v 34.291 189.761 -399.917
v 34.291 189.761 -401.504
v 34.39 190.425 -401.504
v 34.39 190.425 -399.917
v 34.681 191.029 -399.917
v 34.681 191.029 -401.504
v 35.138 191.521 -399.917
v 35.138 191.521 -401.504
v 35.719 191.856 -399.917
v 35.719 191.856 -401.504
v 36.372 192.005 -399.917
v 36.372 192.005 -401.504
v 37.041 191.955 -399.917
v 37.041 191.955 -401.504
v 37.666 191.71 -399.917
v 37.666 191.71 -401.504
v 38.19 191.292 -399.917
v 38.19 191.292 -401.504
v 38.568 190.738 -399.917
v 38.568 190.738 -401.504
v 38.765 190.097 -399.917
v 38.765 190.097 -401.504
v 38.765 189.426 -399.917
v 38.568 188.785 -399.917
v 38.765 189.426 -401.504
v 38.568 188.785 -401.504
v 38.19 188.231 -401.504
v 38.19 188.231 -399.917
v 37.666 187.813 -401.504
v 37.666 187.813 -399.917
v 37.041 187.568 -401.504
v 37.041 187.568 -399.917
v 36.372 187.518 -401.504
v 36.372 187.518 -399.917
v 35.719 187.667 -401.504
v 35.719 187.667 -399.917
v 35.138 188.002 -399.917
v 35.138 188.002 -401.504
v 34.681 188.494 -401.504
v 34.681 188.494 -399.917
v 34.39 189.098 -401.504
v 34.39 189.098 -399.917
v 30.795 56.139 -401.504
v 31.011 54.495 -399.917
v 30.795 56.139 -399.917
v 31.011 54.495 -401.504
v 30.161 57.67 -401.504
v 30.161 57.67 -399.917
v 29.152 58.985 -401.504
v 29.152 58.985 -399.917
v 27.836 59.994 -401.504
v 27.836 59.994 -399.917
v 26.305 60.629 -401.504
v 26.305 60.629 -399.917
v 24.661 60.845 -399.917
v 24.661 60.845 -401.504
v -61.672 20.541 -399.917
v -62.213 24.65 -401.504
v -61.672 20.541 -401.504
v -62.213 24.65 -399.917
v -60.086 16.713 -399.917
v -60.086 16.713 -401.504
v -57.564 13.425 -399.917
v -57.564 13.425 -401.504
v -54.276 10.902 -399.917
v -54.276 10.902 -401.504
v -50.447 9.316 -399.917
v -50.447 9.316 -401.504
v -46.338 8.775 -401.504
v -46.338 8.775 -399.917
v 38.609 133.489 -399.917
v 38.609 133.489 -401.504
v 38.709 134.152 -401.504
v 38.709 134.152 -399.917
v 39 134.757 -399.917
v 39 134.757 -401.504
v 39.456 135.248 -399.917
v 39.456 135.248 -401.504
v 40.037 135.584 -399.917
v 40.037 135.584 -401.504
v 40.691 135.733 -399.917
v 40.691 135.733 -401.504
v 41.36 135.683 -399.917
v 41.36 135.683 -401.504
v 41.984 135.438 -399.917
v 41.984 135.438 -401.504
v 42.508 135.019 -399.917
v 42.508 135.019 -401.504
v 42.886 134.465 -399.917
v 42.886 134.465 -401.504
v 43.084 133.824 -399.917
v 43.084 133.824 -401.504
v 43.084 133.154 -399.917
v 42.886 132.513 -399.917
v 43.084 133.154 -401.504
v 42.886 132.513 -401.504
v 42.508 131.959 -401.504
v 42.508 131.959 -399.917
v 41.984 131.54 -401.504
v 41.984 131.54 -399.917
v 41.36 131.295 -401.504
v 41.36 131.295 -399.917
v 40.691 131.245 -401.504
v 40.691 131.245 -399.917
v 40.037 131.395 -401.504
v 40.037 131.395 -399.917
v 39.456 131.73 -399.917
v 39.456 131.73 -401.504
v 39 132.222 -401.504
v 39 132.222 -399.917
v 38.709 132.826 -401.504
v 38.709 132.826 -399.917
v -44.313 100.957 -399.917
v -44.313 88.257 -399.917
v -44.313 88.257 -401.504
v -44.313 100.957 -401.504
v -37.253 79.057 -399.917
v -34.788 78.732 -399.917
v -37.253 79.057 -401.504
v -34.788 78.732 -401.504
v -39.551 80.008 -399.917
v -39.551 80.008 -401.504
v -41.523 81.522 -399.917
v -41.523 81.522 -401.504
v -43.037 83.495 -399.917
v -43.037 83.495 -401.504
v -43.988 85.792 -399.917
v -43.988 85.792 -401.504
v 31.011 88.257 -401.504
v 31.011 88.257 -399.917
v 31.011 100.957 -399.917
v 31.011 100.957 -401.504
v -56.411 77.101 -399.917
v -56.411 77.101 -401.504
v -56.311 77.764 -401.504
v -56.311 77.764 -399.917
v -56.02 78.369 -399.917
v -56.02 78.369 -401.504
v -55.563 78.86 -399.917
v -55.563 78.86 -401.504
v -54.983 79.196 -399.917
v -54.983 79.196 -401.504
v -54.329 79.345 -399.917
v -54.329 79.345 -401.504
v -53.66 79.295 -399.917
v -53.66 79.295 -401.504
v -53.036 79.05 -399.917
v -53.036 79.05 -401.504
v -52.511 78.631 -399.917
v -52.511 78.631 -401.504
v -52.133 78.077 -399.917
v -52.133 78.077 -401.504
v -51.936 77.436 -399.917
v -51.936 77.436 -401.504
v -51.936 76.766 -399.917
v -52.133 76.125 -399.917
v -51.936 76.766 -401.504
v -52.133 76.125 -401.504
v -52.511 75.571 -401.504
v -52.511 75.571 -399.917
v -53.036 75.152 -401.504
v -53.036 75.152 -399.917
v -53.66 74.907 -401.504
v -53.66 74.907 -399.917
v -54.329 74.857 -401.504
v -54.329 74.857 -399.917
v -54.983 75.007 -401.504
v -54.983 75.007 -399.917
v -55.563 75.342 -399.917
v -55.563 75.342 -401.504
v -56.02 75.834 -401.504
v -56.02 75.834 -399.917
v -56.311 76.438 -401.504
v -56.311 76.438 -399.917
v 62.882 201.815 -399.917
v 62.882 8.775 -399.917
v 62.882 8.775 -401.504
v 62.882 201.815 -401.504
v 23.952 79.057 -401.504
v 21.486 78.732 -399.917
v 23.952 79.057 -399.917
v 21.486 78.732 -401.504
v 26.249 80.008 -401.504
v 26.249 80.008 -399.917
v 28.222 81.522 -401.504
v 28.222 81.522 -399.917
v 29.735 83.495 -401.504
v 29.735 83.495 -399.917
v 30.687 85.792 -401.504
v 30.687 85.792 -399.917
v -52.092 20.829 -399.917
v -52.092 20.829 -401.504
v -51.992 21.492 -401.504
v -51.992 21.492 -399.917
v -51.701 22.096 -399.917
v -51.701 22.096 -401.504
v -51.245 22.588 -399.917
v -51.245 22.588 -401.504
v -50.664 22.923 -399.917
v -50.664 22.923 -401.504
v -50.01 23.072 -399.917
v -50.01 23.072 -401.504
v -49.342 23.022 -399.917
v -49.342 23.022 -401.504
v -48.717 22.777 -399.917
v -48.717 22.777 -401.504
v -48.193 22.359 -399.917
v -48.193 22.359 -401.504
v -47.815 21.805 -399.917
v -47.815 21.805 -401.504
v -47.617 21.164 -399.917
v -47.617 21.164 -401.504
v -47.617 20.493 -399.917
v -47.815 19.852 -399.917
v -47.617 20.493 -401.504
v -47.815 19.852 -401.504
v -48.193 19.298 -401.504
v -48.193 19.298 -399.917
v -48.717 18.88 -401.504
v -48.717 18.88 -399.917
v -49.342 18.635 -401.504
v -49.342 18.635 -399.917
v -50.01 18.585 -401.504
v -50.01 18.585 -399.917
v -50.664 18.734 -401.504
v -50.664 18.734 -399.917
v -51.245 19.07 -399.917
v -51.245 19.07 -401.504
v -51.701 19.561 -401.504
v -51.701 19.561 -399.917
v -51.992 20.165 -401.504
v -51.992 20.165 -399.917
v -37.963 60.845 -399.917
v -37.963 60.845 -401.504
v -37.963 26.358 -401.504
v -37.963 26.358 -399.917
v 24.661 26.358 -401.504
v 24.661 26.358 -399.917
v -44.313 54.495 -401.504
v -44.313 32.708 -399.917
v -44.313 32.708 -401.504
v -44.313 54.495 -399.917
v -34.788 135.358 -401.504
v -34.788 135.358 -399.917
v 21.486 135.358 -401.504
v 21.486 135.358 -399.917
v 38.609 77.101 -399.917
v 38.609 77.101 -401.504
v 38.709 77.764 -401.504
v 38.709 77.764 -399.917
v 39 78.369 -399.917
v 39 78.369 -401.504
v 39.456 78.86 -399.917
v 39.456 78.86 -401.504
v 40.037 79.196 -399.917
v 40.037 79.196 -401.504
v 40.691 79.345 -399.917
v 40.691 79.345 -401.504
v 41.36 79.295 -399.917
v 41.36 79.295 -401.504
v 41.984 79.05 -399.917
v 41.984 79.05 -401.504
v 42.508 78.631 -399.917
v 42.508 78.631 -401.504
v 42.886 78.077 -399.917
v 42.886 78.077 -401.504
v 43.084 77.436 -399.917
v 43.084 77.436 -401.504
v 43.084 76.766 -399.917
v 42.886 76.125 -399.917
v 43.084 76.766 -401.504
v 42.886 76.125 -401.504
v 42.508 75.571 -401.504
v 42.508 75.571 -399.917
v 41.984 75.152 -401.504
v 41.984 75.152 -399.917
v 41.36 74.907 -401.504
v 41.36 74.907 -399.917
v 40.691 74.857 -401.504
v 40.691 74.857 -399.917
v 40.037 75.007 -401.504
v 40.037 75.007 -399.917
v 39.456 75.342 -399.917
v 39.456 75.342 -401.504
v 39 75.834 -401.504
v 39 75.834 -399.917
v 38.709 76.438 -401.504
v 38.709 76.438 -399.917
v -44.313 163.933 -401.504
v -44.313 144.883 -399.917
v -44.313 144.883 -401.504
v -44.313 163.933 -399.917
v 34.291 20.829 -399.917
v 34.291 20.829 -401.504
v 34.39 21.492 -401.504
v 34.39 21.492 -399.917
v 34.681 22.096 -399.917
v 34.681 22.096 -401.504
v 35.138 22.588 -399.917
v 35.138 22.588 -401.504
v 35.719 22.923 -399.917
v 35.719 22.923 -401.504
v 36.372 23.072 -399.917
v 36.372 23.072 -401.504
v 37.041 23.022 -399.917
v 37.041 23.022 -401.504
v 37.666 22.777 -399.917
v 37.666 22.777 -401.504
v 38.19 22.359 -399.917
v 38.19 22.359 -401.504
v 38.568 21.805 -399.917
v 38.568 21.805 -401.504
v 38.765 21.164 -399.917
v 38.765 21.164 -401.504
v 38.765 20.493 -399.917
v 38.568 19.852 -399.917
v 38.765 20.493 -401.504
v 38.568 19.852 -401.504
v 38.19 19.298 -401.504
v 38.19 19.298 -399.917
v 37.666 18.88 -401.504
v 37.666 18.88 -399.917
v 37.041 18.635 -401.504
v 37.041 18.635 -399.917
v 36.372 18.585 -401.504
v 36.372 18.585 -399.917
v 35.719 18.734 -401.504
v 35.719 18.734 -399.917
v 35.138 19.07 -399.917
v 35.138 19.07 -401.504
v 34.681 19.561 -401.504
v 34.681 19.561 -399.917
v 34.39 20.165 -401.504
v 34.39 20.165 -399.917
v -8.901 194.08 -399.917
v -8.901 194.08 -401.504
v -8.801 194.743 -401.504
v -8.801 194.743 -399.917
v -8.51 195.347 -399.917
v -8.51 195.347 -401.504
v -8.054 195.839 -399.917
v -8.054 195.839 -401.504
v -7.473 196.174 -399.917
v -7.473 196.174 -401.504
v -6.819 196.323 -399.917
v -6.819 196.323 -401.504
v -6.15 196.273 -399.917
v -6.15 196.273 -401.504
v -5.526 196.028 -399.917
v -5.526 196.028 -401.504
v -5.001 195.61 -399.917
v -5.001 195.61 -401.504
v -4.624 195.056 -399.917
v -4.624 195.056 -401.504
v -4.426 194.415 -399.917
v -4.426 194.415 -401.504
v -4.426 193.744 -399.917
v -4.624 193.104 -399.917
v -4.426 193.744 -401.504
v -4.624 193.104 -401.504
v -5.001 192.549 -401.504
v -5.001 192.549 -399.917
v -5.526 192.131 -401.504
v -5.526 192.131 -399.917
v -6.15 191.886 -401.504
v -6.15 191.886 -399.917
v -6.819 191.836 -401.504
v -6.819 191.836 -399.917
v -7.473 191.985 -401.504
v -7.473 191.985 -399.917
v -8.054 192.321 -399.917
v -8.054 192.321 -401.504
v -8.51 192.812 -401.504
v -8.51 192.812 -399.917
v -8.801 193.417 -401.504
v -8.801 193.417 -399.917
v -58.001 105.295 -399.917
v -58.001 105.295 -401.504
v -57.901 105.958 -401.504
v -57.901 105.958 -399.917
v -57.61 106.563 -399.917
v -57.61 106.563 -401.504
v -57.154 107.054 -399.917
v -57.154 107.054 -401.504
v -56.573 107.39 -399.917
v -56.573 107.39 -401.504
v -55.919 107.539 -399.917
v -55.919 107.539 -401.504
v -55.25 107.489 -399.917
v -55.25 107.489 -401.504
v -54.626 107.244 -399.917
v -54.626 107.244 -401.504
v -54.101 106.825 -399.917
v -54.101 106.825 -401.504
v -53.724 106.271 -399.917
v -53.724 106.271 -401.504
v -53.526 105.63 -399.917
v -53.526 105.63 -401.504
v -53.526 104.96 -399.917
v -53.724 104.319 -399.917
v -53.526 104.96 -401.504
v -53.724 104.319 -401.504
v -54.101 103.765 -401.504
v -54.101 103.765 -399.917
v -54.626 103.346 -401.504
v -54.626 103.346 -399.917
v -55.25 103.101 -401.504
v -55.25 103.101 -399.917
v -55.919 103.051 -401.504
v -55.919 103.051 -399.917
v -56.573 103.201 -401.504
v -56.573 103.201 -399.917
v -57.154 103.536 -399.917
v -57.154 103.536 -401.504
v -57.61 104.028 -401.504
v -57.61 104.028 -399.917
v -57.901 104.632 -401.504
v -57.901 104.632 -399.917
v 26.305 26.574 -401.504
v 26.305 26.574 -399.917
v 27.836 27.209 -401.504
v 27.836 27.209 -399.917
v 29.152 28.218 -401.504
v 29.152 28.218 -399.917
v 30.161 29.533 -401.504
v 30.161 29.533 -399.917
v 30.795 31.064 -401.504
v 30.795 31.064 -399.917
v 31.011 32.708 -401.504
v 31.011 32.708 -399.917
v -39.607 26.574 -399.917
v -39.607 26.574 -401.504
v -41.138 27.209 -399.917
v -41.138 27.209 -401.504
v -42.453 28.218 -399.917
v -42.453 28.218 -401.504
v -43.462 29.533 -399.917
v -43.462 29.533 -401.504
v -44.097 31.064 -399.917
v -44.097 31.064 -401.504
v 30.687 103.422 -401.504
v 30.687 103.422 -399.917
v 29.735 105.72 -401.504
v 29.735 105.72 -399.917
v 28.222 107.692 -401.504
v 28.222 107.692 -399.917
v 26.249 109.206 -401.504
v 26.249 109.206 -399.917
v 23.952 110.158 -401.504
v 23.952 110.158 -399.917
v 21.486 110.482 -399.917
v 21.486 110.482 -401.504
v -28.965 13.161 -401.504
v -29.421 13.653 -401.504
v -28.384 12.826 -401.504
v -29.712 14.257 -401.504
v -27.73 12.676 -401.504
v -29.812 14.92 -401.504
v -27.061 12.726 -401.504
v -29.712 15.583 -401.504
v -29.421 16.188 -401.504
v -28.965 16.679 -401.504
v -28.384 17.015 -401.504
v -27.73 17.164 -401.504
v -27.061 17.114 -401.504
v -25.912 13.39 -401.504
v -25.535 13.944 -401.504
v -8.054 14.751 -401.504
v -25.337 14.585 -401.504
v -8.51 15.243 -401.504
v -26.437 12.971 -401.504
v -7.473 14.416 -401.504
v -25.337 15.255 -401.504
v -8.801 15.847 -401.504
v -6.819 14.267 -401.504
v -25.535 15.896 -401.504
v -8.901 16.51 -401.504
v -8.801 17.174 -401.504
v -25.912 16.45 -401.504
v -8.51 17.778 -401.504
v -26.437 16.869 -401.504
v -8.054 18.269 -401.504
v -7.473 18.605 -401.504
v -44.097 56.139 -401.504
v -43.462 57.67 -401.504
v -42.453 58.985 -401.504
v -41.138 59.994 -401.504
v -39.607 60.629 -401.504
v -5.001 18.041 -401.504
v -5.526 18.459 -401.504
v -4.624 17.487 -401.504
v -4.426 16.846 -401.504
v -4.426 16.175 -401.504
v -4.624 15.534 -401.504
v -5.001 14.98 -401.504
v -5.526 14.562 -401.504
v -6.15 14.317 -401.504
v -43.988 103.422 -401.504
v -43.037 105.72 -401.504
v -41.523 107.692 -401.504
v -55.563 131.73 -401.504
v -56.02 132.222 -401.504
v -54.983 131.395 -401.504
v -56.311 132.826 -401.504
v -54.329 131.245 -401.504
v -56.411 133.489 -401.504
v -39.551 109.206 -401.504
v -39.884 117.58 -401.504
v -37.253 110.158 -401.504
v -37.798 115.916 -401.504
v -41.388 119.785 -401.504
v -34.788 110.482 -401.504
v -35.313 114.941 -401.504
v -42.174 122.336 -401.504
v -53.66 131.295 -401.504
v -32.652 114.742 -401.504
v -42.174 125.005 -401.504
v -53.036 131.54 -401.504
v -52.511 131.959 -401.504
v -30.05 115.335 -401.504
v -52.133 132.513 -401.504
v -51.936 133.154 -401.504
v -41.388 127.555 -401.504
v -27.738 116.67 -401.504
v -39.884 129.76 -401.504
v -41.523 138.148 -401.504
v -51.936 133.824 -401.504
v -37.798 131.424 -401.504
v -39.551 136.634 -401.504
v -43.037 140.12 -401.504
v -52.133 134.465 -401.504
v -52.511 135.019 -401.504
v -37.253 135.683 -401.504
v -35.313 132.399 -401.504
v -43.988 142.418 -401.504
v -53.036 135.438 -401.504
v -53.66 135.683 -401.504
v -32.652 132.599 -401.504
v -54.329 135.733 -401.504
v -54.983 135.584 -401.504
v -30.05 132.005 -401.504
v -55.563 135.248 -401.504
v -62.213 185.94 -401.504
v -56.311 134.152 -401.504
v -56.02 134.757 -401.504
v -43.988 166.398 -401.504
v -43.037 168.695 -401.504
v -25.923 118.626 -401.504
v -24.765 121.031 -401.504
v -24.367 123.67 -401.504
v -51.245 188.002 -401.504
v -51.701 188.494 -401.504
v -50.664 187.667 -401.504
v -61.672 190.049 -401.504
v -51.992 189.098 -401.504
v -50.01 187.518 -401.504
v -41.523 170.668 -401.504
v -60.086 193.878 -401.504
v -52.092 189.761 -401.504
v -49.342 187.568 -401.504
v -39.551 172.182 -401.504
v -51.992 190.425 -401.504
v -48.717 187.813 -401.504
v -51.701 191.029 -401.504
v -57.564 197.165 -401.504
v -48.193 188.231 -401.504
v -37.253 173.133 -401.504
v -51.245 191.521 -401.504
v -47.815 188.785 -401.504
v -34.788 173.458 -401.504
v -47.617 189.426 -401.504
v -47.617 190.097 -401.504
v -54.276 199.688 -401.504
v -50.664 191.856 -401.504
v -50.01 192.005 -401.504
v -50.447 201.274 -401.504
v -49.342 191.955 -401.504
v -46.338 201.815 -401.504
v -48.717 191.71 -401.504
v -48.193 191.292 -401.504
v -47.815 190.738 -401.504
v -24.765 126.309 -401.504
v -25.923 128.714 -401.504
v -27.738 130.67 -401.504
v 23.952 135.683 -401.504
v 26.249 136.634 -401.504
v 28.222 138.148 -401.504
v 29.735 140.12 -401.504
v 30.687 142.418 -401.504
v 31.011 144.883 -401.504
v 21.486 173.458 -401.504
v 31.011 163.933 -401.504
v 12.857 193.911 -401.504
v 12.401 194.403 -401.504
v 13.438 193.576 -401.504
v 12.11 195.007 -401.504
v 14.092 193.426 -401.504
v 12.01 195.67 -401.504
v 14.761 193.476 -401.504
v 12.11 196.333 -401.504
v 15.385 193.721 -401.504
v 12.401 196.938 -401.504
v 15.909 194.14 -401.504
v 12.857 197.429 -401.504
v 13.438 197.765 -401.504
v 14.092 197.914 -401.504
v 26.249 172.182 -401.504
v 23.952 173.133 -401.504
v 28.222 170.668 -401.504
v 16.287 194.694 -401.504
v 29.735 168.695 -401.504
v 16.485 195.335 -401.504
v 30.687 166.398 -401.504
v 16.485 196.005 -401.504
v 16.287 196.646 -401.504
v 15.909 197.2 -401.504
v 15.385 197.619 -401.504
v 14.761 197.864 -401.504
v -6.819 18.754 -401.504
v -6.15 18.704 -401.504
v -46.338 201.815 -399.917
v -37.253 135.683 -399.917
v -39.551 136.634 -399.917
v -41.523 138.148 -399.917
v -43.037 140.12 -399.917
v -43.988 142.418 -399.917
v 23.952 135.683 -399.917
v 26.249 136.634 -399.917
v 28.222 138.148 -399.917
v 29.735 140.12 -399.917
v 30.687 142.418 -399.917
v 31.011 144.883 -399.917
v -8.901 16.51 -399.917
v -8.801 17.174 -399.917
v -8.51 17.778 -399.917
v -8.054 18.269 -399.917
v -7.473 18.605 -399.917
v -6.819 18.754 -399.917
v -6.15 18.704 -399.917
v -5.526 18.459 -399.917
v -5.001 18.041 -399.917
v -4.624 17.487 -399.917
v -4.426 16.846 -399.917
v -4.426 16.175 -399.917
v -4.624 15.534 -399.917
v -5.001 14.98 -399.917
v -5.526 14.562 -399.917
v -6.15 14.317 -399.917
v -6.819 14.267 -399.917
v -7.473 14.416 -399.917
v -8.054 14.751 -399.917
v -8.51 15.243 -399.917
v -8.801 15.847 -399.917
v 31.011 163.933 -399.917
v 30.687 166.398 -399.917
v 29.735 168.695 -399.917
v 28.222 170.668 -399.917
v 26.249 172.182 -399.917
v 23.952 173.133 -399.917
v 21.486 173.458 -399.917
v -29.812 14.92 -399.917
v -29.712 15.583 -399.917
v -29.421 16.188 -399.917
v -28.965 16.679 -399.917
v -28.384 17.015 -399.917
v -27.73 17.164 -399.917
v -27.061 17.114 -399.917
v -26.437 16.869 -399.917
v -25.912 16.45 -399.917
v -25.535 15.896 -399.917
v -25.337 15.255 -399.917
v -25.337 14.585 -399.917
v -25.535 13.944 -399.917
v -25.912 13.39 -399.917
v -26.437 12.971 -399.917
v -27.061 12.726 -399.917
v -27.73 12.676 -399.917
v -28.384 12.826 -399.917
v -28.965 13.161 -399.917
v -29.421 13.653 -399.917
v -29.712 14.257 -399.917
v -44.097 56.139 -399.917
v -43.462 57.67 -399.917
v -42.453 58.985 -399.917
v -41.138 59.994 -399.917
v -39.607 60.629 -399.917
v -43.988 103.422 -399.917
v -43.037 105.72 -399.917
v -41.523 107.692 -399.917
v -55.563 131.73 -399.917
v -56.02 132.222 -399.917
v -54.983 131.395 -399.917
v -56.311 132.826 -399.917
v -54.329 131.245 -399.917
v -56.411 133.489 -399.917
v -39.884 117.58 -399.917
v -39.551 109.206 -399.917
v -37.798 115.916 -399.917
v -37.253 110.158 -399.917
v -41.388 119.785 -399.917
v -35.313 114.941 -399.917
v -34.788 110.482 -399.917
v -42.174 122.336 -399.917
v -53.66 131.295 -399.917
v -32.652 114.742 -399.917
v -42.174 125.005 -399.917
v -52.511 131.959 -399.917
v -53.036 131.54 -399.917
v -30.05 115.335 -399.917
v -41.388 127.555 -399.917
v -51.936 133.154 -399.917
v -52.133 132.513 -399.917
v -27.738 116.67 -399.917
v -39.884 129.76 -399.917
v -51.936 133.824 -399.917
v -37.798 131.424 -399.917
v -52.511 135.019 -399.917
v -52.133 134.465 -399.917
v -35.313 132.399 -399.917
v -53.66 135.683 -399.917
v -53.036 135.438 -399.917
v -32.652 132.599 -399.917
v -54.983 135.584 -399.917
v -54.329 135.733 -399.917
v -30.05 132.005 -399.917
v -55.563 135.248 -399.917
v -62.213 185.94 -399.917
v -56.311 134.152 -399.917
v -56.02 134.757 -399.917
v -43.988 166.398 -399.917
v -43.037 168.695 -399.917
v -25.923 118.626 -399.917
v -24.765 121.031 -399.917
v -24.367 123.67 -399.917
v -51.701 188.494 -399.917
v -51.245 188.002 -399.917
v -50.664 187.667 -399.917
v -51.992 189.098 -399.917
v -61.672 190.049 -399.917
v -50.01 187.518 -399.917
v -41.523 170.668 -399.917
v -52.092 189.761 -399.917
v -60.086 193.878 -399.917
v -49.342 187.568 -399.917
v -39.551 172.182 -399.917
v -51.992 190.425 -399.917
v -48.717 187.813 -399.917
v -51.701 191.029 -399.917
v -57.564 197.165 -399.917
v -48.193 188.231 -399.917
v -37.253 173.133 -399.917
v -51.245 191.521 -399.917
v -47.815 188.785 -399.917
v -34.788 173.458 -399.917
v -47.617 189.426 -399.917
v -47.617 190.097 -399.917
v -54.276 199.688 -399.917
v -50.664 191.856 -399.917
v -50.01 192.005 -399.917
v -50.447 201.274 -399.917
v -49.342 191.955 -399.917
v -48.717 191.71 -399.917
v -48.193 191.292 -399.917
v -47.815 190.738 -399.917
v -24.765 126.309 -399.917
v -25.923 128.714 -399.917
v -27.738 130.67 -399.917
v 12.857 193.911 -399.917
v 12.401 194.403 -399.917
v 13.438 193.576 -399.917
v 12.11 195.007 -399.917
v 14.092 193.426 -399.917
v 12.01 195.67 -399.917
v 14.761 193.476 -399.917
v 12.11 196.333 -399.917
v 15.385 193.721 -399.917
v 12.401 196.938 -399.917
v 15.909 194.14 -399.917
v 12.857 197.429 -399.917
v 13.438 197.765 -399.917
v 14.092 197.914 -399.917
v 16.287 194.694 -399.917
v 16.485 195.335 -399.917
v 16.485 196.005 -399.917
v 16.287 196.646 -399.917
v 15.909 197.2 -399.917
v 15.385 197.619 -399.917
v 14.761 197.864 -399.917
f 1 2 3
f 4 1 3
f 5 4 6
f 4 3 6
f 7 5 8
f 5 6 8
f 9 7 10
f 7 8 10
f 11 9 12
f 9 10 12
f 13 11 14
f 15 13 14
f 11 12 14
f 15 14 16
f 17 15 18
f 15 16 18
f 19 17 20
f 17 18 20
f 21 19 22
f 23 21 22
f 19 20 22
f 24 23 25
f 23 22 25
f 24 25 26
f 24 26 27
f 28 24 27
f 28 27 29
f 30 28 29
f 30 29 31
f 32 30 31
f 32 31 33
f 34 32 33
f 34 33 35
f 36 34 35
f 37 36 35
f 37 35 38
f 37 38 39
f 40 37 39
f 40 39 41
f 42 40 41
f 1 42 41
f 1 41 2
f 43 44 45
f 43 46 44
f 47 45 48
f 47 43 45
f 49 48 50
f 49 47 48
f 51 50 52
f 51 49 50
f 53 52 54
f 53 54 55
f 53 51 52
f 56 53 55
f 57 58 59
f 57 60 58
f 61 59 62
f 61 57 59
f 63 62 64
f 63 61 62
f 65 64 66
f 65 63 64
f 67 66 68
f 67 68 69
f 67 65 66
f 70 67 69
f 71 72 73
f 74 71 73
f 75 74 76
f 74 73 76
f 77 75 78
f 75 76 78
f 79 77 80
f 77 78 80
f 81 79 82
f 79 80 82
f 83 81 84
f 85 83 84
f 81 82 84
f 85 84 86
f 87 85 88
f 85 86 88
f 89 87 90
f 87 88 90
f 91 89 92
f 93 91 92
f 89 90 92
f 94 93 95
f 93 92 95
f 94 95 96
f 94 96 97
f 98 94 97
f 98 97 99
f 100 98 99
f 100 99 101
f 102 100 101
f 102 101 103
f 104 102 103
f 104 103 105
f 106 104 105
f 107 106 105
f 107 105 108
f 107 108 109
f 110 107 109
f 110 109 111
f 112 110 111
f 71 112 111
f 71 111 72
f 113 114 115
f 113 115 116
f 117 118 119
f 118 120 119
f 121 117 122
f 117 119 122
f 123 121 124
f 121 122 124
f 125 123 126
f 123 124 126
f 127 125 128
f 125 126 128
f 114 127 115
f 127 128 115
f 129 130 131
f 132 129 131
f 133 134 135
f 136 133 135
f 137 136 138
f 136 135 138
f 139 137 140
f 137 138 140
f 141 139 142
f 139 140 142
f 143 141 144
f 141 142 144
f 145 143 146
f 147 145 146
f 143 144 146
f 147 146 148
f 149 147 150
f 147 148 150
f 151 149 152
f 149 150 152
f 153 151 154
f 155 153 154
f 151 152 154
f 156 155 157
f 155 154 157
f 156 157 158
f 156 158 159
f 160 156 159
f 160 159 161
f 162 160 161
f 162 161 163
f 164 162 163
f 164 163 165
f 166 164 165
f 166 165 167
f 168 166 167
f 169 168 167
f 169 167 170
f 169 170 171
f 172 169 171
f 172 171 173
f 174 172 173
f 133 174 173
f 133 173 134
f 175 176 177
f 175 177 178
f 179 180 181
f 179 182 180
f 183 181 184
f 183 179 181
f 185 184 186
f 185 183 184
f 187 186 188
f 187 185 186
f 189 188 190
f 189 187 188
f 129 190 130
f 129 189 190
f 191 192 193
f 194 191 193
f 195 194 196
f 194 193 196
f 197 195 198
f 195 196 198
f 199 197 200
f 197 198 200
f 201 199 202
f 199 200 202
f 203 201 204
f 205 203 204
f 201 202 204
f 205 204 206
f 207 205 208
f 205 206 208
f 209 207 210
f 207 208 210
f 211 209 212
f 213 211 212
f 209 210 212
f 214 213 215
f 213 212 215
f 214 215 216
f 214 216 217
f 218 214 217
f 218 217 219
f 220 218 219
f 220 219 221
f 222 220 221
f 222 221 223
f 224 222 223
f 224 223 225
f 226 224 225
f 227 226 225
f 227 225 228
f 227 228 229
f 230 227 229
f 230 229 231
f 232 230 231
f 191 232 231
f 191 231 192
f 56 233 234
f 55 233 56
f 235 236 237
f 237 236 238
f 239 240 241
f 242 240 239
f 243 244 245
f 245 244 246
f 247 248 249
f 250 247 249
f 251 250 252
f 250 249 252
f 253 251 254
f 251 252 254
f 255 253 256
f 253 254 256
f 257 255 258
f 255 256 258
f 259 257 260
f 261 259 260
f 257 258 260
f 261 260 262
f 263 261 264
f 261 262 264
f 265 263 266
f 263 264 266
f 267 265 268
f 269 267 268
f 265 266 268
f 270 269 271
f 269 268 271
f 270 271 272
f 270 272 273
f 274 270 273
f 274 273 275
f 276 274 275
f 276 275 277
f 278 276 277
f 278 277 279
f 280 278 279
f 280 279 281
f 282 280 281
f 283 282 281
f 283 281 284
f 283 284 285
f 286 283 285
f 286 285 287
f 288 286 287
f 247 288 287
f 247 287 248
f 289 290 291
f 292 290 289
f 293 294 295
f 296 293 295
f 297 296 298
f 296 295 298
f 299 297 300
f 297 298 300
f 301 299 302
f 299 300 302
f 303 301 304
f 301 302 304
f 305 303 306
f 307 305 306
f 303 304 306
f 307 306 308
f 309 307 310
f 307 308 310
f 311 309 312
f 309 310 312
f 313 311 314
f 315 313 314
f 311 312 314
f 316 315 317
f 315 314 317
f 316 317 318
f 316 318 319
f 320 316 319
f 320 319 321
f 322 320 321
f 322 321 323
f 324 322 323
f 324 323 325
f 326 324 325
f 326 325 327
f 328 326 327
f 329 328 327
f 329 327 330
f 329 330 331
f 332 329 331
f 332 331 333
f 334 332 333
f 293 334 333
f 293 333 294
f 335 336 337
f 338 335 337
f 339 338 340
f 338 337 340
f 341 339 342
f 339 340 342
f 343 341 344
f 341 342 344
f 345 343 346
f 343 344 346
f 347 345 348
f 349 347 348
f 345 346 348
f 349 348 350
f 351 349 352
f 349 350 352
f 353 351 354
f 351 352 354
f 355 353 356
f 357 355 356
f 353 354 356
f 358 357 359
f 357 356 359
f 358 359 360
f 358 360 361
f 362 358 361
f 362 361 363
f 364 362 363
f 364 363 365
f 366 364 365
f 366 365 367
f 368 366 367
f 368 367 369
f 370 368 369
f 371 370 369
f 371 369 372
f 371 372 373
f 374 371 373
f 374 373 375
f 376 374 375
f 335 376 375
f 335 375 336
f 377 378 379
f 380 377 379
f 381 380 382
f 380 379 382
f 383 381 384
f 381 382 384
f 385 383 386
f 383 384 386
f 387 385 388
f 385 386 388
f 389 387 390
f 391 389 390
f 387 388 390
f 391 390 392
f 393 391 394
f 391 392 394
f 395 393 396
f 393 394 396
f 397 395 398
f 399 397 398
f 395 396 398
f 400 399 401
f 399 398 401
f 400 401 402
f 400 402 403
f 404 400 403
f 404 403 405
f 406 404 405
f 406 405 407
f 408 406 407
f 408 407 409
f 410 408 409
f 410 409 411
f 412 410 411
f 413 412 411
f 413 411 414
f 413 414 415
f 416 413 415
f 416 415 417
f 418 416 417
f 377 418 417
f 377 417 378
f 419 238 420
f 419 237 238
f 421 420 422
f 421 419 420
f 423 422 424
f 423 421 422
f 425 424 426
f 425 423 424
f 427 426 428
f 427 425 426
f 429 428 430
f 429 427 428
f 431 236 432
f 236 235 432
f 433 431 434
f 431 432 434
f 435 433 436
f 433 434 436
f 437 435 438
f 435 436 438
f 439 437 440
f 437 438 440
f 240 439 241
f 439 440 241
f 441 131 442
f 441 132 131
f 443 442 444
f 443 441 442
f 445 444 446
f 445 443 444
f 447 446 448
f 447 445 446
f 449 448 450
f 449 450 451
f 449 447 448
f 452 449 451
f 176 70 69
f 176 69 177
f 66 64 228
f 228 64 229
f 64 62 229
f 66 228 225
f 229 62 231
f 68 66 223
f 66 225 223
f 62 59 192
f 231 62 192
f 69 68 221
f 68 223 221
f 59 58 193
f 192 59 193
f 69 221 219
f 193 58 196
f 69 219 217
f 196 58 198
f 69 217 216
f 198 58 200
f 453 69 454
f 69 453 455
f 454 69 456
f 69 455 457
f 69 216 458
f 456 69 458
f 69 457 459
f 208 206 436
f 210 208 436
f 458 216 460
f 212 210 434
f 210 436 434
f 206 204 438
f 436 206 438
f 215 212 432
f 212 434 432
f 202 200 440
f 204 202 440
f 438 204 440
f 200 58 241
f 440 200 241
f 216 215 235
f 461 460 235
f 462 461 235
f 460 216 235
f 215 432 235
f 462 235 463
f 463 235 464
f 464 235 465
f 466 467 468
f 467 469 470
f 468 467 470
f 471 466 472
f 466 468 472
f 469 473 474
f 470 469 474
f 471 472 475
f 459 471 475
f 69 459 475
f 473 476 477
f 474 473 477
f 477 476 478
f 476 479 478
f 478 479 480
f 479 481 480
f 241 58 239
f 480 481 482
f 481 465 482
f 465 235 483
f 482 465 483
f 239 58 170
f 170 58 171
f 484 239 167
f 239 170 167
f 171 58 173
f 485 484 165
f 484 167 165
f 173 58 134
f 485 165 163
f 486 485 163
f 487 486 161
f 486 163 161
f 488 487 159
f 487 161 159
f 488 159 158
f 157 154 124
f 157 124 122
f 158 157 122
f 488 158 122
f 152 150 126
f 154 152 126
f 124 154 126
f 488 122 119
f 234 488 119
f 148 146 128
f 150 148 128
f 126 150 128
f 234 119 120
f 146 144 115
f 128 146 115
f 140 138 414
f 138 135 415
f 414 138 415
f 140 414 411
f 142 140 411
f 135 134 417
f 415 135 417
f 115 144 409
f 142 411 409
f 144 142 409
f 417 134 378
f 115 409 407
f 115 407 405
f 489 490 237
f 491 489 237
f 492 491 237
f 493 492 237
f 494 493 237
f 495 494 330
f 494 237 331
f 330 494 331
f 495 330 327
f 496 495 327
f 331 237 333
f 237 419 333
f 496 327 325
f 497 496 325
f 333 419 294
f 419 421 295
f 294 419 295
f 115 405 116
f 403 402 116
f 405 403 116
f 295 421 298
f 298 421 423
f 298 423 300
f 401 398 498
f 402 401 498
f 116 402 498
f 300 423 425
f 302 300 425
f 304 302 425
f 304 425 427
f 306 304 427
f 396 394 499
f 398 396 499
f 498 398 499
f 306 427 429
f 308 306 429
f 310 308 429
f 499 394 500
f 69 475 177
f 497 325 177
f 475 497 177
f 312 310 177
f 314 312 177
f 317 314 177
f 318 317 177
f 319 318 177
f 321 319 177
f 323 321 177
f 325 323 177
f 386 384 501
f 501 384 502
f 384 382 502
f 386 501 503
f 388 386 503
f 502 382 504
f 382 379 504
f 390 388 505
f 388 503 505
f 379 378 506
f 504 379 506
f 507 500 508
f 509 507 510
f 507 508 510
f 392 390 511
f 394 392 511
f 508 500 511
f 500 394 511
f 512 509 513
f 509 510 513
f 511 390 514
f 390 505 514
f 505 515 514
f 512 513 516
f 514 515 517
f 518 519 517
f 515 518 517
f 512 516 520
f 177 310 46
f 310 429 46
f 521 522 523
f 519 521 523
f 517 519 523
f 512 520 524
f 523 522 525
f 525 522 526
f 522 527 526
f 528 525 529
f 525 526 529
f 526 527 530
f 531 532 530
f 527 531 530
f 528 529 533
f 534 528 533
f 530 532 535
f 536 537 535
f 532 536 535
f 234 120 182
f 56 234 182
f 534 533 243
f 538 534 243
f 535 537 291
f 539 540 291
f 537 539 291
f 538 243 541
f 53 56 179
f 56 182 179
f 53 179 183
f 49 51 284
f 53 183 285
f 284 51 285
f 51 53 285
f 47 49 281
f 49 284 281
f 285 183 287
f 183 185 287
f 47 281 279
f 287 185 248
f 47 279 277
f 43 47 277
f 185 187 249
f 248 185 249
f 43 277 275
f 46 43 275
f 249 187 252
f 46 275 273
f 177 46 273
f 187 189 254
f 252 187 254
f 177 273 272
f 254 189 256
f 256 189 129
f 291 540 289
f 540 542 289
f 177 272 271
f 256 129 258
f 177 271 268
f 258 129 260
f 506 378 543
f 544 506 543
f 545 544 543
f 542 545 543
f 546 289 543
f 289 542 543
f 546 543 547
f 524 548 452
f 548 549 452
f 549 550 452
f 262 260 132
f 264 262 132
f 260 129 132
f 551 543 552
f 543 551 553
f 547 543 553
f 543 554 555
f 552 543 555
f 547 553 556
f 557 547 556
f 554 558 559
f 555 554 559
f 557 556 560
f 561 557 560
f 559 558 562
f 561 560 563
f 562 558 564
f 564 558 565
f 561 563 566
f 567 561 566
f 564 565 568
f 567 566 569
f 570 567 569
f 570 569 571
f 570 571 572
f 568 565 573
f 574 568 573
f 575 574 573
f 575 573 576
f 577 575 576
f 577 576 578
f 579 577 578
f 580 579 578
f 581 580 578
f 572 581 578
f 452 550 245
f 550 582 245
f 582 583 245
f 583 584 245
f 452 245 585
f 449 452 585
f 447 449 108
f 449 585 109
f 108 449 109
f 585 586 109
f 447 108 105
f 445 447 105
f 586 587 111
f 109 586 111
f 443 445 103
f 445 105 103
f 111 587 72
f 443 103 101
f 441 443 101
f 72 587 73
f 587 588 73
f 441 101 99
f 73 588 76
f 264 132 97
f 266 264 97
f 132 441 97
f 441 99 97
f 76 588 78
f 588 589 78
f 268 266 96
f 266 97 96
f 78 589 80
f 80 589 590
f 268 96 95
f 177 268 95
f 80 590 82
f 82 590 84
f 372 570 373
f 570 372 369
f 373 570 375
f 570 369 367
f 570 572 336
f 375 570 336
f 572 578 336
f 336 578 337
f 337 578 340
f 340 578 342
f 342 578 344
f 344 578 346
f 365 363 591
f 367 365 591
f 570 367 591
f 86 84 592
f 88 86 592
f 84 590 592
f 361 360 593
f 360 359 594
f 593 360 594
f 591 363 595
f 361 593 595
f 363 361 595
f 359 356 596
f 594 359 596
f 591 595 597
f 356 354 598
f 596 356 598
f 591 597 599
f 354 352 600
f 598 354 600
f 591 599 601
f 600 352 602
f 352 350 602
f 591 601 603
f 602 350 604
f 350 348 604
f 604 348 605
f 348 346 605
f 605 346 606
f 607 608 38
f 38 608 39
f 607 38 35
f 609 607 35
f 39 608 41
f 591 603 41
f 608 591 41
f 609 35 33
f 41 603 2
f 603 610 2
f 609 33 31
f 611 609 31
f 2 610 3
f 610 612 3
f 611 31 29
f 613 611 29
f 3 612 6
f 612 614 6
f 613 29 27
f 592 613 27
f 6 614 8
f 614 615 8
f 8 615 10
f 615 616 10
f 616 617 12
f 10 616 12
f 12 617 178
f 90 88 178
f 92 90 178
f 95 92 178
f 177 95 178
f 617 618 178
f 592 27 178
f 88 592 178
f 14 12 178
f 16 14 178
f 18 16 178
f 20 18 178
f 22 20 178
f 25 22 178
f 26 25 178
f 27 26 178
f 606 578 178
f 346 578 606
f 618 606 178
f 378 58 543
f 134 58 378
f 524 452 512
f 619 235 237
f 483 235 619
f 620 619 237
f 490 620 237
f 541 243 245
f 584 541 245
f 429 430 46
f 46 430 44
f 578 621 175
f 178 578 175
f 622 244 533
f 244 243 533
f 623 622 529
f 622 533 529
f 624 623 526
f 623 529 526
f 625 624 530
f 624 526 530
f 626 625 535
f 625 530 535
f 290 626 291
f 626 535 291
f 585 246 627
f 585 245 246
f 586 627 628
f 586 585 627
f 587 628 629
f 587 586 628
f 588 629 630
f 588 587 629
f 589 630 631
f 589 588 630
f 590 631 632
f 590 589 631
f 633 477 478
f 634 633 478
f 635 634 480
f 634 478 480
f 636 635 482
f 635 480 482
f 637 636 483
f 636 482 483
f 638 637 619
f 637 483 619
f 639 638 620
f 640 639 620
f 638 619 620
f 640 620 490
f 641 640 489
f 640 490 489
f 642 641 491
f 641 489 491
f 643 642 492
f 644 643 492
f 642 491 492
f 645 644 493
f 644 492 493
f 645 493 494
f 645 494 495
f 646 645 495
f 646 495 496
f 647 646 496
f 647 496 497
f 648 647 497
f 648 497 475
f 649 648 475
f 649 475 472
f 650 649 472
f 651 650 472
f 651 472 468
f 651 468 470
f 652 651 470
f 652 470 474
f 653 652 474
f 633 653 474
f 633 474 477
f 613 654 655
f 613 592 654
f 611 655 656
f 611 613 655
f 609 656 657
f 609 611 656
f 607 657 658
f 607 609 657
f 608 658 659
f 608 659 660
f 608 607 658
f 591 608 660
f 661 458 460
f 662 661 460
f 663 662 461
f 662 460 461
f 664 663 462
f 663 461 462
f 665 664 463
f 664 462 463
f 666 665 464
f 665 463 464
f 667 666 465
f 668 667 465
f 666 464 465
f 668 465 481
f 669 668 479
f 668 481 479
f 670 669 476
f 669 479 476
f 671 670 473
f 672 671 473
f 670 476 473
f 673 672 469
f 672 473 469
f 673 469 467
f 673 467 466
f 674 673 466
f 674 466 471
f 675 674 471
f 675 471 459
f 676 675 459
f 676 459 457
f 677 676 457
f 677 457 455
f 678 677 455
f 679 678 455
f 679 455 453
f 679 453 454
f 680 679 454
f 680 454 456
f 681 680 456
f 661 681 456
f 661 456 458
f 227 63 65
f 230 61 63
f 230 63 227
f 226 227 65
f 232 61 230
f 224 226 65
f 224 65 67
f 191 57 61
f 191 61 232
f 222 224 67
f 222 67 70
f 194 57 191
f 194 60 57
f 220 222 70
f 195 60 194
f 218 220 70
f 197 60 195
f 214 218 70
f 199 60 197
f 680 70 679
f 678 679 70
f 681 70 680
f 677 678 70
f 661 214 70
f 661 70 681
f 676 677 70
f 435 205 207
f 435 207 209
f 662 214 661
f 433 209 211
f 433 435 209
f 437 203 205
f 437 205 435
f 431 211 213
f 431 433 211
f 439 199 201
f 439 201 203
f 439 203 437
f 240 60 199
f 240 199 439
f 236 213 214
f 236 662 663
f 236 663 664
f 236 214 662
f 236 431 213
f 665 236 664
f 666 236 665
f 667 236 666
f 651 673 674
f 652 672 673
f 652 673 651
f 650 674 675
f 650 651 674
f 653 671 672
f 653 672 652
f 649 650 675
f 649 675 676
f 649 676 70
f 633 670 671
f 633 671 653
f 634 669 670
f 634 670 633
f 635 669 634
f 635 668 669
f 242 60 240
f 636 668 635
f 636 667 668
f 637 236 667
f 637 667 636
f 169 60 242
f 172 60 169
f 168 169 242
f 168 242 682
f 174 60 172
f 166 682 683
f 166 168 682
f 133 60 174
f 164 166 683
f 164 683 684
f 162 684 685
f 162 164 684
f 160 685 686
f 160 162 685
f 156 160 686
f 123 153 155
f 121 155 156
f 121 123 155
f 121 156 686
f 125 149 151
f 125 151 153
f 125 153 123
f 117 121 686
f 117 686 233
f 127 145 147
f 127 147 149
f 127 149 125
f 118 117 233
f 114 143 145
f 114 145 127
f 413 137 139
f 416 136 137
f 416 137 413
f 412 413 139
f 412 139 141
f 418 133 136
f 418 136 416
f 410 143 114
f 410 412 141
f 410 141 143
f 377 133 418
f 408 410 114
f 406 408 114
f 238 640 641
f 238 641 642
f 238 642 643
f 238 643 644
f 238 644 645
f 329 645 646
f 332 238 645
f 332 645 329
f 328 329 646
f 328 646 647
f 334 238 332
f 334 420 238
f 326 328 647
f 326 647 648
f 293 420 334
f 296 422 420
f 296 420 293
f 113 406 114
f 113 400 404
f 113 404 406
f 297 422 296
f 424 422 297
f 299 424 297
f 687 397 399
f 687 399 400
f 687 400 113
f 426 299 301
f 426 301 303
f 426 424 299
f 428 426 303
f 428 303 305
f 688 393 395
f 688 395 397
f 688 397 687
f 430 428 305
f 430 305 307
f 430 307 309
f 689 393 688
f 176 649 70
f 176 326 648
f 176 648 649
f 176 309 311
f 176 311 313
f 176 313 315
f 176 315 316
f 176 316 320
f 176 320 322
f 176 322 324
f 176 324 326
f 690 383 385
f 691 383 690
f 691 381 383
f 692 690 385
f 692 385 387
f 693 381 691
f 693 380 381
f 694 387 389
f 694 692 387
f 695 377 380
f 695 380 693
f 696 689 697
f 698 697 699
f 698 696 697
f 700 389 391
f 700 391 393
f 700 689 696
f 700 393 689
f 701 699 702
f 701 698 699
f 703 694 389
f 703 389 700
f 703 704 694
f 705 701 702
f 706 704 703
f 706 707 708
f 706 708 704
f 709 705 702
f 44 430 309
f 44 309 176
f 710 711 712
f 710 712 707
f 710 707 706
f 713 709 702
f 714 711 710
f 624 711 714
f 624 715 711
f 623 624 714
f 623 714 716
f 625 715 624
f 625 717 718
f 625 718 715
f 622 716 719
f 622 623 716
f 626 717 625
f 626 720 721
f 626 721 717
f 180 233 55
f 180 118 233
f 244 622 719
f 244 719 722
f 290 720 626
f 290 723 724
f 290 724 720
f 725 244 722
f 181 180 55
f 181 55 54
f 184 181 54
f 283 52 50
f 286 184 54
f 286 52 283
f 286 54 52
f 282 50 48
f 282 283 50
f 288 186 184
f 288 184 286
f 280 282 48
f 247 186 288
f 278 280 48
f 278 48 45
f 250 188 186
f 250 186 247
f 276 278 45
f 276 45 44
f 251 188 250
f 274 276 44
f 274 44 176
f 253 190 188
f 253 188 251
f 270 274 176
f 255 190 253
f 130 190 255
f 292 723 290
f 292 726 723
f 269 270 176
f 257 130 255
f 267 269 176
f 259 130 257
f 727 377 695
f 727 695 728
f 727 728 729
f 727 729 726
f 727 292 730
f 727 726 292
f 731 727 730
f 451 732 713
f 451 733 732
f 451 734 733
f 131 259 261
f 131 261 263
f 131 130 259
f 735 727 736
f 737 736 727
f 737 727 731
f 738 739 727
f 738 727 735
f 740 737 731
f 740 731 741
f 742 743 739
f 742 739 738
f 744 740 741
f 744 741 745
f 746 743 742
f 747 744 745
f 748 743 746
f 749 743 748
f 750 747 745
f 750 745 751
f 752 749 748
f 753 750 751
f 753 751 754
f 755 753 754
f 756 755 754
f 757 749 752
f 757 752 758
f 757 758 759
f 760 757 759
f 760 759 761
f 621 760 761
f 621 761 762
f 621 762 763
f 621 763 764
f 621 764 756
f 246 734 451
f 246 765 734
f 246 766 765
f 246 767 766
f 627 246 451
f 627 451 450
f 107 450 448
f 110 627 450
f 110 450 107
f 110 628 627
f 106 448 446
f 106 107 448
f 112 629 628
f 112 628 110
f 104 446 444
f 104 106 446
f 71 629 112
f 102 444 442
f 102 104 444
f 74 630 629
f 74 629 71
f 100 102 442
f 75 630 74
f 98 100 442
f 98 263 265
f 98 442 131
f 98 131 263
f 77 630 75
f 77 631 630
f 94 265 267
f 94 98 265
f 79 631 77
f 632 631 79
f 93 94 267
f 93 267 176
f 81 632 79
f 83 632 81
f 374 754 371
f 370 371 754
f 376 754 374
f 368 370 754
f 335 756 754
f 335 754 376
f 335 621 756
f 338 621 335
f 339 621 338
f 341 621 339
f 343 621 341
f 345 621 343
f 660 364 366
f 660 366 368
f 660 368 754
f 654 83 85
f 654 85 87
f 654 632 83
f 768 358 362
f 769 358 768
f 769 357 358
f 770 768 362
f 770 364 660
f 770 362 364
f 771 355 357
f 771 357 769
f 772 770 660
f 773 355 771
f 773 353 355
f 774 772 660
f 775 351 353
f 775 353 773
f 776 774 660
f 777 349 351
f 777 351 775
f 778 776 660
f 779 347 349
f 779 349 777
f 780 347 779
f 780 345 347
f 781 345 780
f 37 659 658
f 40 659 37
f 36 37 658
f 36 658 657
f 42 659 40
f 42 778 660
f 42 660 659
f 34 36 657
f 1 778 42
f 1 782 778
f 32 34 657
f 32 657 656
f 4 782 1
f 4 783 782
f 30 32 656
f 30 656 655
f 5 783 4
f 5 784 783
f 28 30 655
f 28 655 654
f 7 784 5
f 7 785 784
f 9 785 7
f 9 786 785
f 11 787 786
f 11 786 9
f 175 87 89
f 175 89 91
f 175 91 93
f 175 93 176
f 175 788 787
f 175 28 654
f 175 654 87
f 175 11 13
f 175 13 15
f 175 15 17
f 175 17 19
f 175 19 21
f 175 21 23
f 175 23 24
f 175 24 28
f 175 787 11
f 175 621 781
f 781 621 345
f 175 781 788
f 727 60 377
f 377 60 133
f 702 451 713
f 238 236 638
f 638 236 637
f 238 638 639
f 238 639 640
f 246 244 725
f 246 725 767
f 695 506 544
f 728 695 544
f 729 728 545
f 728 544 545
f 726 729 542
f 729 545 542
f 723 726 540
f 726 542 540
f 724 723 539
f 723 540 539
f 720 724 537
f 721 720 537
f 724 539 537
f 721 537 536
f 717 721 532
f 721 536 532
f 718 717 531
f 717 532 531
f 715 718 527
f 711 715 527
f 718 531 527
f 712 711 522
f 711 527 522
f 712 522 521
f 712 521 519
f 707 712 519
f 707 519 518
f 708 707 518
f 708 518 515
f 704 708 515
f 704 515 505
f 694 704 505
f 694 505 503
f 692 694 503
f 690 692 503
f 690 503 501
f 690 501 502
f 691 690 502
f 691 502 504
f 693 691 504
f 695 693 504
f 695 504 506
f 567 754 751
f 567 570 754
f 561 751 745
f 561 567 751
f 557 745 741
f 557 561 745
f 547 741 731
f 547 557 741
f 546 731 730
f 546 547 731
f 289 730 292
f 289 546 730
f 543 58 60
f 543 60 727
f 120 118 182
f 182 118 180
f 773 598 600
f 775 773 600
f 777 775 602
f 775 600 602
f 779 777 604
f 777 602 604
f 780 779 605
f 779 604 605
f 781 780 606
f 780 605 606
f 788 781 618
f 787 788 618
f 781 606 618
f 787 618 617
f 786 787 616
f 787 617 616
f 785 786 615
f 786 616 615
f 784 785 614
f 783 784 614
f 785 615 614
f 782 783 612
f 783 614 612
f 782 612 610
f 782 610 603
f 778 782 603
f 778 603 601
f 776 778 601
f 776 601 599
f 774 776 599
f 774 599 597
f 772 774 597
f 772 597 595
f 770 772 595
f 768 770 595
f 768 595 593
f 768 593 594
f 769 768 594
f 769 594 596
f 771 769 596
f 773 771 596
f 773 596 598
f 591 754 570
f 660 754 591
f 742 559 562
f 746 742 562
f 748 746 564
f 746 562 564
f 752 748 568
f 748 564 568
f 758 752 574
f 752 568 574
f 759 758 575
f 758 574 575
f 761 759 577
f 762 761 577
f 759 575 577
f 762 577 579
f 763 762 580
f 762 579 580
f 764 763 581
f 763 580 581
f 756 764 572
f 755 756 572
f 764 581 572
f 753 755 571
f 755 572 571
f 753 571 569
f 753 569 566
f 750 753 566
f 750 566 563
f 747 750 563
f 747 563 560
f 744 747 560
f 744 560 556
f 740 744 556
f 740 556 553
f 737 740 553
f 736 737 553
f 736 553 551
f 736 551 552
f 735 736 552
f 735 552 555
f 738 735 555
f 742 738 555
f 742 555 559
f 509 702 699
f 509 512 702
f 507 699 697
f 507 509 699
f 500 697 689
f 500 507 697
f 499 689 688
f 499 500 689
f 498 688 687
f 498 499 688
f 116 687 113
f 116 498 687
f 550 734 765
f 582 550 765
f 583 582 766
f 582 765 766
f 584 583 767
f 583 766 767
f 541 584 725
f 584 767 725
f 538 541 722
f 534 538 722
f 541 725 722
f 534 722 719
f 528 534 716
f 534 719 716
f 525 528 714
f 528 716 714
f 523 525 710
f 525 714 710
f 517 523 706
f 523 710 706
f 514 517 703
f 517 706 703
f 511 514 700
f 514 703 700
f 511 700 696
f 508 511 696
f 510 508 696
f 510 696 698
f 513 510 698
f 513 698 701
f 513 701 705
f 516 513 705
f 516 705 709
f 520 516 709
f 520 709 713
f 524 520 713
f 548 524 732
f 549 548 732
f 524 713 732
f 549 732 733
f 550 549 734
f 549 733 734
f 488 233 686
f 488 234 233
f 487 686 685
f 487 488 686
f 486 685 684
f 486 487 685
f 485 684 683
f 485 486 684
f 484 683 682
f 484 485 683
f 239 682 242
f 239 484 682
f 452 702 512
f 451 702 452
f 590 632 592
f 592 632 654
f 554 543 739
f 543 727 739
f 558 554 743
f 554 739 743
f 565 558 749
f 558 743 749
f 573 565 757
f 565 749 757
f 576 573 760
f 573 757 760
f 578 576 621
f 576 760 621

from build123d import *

# Parameters (mm, degrees)
SKETCH2_W            = 111.125
SKETCH2_H            = 193.04
BOSS_EXTRUDE1_DEPTH  = 1.5875
M4_CLEARANCE_HOLE1_D = 4.5
FILLET1_R            = 15.875
SKETCH6_R            = 2.4003
SKETCH6_R_2          = 3
SKETCH6_R_3          = 6.477
SKETCH6_R_4          = 10.762
CUT_EXTRUDE1_DEPTH   = 212.192646736
SKETCH7_W            = 13.97
SKETCH7_H            = 193.04
BOSS_EXTRUDE2_DEPTH  = 1.5875
SKETCH8_W            = 75.32443897
SKETCH8_H            = 38.1
SKETCH8_R            = 10.762
SKETCH8_R_2          = 3
SKETCH8_H_2          = 31.75
SKETCH8_H_3          = 34.487219484
SKETCH8_R_3          = 2.4003
SKETCH8_R_4          = 6.477
SKETCH8_R_5          = 8.9535
CUT_EXTRUDE2_DEPTH   = 1.5875
FILLET2_R            = 9.525
FILLET3_R            = 6.35
FILLET4_R            = 9.525


with BuildPart() as part:
    # Sketch2 → Boss-Extrude1 (new body)
    with BuildSketch(Plane.XY.offset(-401.504104662)):
        with Locations((-6.650833159, 105.295051609)):
            Rectangle(SKETCH2_W, SKETCH2_H)
    extrude(amount=BOSS_EXTRUDE1_DEPTH)

    # M4 Clearance Hole1 (through all)
    with Locations(Plane.XY.offset(-399.916604662)):
        with Locations((36.540537091, 189.761421859), (-6.650833159, 194.079751609), (-49.842203409, 189.761421859), (-54.160533159, 133.489051609), (-54.160533159, 77.101051609), (-49.842203409, 20.82868136), (-6.650833159, 16.510351609), (36.540537091, 20.82868136), (40.858866841, 77.101051609), (40.858866841, 133.489051609), (14.260079544, 195.670051609), (-55.750833159, 105.295051609), (-27.561745863, 14.920051609)):
            Hole(M4_CLEARANCE_HOLE1_D / 2)

    # Fillet1
    fillet1_edges = [part.edges().sort_by_distance(p)[0] for p in [
        (-62.213333159, 201.815051609, -400.710354662),
        (-62.213333159, 8.775051609, -400.710354662),
    ]]
    fillet(fillet1_edges, radius=FILLET1_R)

    # Sketch6 → Cut-Extrude1 (cut, through all)
    with BuildSketch(Plane.XY.offset(-399.916604662)):
        with Locations((-34.590833159, 43.382551609)):
            Circle(SKETCH6_R)
        with Locations((21.289166841, 43.382551609)):
            Circle(SKETCH6_R)
        with Locations((-20.884724927, 142.590766631)):
            Circle(SKETCH6_R_2)
        with Locations((7.583058609, 166.225175879)):
            Circle(SKETCH6_R_2)
        with Locations((3.509166841, 43.382551609)):
            Circle(SKETCH6_R_3)
        with Locations((-16.810833159, 43.382551609)):
            Circle(SKETCH6_R_3)
        with Locations((-33.320833159, 123.670051609)):
            Circle(SKETCH6_R_3)
        with Locations((-6.650833159, 154.407971255)):
            Circle(SKETCH6_R_4)
        with Locations((-6.650833159, 94.607131964)):
            Circle(SKETCH6_R_4)
    extrude(amount=-CUT_EXTRUDE1_DEPTH, mode=Mode.SUBTRACT)

    # Sketch7 → Boss-Extrude2 (add)
    with BuildSketch(Plane.XY.offset(-399.916604662)):
        with Locations((55.896666841, 105.295051609)):
            Rectangle(SKETCH7_W, SKETCH7_H)
    extrude(amount=-BOSS_EXTRUDE2_DEPTH)

    # Sketch8 → Cut-Extrude2 (cut)
    # profile 1 of 4: a face of its own
    with BuildSketch(Plane.XY.offset(-399.916604662)):
        with Locations((-6.650833159, 154.407971255)):
            Rectangle(SKETCH8_W, SKETCH8_H)
        with Locations((-6.650833159, 154.407971255)):
            Circle(SKETCH8_R, mode=Mode.SUBTRACT)
        with Locations((7.583058609, 166.225175879)):
            Circle(SKETCH8_R_2, mode=Mode.SUBTRACT)
        with Locations((-20.884724927, 142.590766631)):
            Circle(SKETCH8_R_2, mode=Mode.SUBTRACT)
    # profile 2 of 4: a face of its own
    with BuildSketch(Plane.XY.offset(-399.916604662)):
        with Locations((-6.650833159, 94.607131964)):
            Rectangle(SKETCH8_W, SKETCH8_H_2)
        with Locations((-6.650833159, 94.607131964)):
            Circle(SKETCH8_R, mode=Mode.SUBTRACT)
    # profile 3 of 4: a face of its own
    with BuildSketch(Plane.XY.offset(-399.916604662)):
        with Locations((-6.650833159, 43.601441867)):
            Rectangle(SKETCH8_W, SKETCH8_H_3)
        with Locations((-34.590833159, 43.382551609)):
            Circle(SKETCH8_R_3, mode=Mode.SUBTRACT)
        with Locations((-16.810833159, 43.382551609)):
            Circle(SKETCH8_R_4, mode=Mode.SUBTRACT)
        with Locations((3.509166841, 43.382551609)):
            Circle(SKETCH8_R_4, mode=Mode.SUBTRACT)
        with Locations((21.289166841, 43.382551609)):
            Circle(SKETCH8_R_3, mode=Mode.SUBTRACT)
    # profile 4 of 4: a face of its own
    with BuildSketch(Plane.XY.offset(-399.916604662)):
        with Locations((-33.320833159, 123.670051609)):
            Circle(SKETCH8_R_5)
        with Locations((-33.320833159, 123.670051609)):
            Circle(SKETCH8_R_4, mode=Mode.SUBTRACT)
    extrude(amount=-CUT_EXTRUDE2_DEPTH, mode=Mode.SUBTRACT)

    # Fillet2
    fillet2_edges = [part.edges().sort_by_distance(p)[0] for p in [
        (-44.313052644, 173.457971255, -400.710354662),
        (-44.313052644, 135.357971255, -400.710354662),
        (31.011386326, 135.357971255, -400.710354662),
        (31.011386326, 173.457971255, -400.710354662),
    ]]
    fillet(fillet2_edges, radius=FILLET2_R)

    # Fillet3
    fillet3_edges = [part.edges().sort_by_distance(p)[0] for p in [
        (-44.313052644, 26.357832125, -400.710354662),
        (31.011386326, 26.357832125, -400.710354662),
        (31.011386326, 60.845051609, -400.710354662),
        (-44.313052644, 60.845051609, -400.710354662),
    ]]
    fillet(fillet3_edges, radius=FILLET3_R)

    # Fillet4
    fillet4_edges = [part.edges().sort_by_distance(p)[0] for p in [
        (-44.313052644, 110.482131964, -400.710354662),
        (-44.313052644, 78.732131964, -400.710354662),
        (31.011386326, 78.732131964, -400.710354662),
        (31.011386326, 110.482131964, -400.710354662),
    ]]
    fillet(fillet4_edges, radius=FILLET4_R)


solid = part.part
